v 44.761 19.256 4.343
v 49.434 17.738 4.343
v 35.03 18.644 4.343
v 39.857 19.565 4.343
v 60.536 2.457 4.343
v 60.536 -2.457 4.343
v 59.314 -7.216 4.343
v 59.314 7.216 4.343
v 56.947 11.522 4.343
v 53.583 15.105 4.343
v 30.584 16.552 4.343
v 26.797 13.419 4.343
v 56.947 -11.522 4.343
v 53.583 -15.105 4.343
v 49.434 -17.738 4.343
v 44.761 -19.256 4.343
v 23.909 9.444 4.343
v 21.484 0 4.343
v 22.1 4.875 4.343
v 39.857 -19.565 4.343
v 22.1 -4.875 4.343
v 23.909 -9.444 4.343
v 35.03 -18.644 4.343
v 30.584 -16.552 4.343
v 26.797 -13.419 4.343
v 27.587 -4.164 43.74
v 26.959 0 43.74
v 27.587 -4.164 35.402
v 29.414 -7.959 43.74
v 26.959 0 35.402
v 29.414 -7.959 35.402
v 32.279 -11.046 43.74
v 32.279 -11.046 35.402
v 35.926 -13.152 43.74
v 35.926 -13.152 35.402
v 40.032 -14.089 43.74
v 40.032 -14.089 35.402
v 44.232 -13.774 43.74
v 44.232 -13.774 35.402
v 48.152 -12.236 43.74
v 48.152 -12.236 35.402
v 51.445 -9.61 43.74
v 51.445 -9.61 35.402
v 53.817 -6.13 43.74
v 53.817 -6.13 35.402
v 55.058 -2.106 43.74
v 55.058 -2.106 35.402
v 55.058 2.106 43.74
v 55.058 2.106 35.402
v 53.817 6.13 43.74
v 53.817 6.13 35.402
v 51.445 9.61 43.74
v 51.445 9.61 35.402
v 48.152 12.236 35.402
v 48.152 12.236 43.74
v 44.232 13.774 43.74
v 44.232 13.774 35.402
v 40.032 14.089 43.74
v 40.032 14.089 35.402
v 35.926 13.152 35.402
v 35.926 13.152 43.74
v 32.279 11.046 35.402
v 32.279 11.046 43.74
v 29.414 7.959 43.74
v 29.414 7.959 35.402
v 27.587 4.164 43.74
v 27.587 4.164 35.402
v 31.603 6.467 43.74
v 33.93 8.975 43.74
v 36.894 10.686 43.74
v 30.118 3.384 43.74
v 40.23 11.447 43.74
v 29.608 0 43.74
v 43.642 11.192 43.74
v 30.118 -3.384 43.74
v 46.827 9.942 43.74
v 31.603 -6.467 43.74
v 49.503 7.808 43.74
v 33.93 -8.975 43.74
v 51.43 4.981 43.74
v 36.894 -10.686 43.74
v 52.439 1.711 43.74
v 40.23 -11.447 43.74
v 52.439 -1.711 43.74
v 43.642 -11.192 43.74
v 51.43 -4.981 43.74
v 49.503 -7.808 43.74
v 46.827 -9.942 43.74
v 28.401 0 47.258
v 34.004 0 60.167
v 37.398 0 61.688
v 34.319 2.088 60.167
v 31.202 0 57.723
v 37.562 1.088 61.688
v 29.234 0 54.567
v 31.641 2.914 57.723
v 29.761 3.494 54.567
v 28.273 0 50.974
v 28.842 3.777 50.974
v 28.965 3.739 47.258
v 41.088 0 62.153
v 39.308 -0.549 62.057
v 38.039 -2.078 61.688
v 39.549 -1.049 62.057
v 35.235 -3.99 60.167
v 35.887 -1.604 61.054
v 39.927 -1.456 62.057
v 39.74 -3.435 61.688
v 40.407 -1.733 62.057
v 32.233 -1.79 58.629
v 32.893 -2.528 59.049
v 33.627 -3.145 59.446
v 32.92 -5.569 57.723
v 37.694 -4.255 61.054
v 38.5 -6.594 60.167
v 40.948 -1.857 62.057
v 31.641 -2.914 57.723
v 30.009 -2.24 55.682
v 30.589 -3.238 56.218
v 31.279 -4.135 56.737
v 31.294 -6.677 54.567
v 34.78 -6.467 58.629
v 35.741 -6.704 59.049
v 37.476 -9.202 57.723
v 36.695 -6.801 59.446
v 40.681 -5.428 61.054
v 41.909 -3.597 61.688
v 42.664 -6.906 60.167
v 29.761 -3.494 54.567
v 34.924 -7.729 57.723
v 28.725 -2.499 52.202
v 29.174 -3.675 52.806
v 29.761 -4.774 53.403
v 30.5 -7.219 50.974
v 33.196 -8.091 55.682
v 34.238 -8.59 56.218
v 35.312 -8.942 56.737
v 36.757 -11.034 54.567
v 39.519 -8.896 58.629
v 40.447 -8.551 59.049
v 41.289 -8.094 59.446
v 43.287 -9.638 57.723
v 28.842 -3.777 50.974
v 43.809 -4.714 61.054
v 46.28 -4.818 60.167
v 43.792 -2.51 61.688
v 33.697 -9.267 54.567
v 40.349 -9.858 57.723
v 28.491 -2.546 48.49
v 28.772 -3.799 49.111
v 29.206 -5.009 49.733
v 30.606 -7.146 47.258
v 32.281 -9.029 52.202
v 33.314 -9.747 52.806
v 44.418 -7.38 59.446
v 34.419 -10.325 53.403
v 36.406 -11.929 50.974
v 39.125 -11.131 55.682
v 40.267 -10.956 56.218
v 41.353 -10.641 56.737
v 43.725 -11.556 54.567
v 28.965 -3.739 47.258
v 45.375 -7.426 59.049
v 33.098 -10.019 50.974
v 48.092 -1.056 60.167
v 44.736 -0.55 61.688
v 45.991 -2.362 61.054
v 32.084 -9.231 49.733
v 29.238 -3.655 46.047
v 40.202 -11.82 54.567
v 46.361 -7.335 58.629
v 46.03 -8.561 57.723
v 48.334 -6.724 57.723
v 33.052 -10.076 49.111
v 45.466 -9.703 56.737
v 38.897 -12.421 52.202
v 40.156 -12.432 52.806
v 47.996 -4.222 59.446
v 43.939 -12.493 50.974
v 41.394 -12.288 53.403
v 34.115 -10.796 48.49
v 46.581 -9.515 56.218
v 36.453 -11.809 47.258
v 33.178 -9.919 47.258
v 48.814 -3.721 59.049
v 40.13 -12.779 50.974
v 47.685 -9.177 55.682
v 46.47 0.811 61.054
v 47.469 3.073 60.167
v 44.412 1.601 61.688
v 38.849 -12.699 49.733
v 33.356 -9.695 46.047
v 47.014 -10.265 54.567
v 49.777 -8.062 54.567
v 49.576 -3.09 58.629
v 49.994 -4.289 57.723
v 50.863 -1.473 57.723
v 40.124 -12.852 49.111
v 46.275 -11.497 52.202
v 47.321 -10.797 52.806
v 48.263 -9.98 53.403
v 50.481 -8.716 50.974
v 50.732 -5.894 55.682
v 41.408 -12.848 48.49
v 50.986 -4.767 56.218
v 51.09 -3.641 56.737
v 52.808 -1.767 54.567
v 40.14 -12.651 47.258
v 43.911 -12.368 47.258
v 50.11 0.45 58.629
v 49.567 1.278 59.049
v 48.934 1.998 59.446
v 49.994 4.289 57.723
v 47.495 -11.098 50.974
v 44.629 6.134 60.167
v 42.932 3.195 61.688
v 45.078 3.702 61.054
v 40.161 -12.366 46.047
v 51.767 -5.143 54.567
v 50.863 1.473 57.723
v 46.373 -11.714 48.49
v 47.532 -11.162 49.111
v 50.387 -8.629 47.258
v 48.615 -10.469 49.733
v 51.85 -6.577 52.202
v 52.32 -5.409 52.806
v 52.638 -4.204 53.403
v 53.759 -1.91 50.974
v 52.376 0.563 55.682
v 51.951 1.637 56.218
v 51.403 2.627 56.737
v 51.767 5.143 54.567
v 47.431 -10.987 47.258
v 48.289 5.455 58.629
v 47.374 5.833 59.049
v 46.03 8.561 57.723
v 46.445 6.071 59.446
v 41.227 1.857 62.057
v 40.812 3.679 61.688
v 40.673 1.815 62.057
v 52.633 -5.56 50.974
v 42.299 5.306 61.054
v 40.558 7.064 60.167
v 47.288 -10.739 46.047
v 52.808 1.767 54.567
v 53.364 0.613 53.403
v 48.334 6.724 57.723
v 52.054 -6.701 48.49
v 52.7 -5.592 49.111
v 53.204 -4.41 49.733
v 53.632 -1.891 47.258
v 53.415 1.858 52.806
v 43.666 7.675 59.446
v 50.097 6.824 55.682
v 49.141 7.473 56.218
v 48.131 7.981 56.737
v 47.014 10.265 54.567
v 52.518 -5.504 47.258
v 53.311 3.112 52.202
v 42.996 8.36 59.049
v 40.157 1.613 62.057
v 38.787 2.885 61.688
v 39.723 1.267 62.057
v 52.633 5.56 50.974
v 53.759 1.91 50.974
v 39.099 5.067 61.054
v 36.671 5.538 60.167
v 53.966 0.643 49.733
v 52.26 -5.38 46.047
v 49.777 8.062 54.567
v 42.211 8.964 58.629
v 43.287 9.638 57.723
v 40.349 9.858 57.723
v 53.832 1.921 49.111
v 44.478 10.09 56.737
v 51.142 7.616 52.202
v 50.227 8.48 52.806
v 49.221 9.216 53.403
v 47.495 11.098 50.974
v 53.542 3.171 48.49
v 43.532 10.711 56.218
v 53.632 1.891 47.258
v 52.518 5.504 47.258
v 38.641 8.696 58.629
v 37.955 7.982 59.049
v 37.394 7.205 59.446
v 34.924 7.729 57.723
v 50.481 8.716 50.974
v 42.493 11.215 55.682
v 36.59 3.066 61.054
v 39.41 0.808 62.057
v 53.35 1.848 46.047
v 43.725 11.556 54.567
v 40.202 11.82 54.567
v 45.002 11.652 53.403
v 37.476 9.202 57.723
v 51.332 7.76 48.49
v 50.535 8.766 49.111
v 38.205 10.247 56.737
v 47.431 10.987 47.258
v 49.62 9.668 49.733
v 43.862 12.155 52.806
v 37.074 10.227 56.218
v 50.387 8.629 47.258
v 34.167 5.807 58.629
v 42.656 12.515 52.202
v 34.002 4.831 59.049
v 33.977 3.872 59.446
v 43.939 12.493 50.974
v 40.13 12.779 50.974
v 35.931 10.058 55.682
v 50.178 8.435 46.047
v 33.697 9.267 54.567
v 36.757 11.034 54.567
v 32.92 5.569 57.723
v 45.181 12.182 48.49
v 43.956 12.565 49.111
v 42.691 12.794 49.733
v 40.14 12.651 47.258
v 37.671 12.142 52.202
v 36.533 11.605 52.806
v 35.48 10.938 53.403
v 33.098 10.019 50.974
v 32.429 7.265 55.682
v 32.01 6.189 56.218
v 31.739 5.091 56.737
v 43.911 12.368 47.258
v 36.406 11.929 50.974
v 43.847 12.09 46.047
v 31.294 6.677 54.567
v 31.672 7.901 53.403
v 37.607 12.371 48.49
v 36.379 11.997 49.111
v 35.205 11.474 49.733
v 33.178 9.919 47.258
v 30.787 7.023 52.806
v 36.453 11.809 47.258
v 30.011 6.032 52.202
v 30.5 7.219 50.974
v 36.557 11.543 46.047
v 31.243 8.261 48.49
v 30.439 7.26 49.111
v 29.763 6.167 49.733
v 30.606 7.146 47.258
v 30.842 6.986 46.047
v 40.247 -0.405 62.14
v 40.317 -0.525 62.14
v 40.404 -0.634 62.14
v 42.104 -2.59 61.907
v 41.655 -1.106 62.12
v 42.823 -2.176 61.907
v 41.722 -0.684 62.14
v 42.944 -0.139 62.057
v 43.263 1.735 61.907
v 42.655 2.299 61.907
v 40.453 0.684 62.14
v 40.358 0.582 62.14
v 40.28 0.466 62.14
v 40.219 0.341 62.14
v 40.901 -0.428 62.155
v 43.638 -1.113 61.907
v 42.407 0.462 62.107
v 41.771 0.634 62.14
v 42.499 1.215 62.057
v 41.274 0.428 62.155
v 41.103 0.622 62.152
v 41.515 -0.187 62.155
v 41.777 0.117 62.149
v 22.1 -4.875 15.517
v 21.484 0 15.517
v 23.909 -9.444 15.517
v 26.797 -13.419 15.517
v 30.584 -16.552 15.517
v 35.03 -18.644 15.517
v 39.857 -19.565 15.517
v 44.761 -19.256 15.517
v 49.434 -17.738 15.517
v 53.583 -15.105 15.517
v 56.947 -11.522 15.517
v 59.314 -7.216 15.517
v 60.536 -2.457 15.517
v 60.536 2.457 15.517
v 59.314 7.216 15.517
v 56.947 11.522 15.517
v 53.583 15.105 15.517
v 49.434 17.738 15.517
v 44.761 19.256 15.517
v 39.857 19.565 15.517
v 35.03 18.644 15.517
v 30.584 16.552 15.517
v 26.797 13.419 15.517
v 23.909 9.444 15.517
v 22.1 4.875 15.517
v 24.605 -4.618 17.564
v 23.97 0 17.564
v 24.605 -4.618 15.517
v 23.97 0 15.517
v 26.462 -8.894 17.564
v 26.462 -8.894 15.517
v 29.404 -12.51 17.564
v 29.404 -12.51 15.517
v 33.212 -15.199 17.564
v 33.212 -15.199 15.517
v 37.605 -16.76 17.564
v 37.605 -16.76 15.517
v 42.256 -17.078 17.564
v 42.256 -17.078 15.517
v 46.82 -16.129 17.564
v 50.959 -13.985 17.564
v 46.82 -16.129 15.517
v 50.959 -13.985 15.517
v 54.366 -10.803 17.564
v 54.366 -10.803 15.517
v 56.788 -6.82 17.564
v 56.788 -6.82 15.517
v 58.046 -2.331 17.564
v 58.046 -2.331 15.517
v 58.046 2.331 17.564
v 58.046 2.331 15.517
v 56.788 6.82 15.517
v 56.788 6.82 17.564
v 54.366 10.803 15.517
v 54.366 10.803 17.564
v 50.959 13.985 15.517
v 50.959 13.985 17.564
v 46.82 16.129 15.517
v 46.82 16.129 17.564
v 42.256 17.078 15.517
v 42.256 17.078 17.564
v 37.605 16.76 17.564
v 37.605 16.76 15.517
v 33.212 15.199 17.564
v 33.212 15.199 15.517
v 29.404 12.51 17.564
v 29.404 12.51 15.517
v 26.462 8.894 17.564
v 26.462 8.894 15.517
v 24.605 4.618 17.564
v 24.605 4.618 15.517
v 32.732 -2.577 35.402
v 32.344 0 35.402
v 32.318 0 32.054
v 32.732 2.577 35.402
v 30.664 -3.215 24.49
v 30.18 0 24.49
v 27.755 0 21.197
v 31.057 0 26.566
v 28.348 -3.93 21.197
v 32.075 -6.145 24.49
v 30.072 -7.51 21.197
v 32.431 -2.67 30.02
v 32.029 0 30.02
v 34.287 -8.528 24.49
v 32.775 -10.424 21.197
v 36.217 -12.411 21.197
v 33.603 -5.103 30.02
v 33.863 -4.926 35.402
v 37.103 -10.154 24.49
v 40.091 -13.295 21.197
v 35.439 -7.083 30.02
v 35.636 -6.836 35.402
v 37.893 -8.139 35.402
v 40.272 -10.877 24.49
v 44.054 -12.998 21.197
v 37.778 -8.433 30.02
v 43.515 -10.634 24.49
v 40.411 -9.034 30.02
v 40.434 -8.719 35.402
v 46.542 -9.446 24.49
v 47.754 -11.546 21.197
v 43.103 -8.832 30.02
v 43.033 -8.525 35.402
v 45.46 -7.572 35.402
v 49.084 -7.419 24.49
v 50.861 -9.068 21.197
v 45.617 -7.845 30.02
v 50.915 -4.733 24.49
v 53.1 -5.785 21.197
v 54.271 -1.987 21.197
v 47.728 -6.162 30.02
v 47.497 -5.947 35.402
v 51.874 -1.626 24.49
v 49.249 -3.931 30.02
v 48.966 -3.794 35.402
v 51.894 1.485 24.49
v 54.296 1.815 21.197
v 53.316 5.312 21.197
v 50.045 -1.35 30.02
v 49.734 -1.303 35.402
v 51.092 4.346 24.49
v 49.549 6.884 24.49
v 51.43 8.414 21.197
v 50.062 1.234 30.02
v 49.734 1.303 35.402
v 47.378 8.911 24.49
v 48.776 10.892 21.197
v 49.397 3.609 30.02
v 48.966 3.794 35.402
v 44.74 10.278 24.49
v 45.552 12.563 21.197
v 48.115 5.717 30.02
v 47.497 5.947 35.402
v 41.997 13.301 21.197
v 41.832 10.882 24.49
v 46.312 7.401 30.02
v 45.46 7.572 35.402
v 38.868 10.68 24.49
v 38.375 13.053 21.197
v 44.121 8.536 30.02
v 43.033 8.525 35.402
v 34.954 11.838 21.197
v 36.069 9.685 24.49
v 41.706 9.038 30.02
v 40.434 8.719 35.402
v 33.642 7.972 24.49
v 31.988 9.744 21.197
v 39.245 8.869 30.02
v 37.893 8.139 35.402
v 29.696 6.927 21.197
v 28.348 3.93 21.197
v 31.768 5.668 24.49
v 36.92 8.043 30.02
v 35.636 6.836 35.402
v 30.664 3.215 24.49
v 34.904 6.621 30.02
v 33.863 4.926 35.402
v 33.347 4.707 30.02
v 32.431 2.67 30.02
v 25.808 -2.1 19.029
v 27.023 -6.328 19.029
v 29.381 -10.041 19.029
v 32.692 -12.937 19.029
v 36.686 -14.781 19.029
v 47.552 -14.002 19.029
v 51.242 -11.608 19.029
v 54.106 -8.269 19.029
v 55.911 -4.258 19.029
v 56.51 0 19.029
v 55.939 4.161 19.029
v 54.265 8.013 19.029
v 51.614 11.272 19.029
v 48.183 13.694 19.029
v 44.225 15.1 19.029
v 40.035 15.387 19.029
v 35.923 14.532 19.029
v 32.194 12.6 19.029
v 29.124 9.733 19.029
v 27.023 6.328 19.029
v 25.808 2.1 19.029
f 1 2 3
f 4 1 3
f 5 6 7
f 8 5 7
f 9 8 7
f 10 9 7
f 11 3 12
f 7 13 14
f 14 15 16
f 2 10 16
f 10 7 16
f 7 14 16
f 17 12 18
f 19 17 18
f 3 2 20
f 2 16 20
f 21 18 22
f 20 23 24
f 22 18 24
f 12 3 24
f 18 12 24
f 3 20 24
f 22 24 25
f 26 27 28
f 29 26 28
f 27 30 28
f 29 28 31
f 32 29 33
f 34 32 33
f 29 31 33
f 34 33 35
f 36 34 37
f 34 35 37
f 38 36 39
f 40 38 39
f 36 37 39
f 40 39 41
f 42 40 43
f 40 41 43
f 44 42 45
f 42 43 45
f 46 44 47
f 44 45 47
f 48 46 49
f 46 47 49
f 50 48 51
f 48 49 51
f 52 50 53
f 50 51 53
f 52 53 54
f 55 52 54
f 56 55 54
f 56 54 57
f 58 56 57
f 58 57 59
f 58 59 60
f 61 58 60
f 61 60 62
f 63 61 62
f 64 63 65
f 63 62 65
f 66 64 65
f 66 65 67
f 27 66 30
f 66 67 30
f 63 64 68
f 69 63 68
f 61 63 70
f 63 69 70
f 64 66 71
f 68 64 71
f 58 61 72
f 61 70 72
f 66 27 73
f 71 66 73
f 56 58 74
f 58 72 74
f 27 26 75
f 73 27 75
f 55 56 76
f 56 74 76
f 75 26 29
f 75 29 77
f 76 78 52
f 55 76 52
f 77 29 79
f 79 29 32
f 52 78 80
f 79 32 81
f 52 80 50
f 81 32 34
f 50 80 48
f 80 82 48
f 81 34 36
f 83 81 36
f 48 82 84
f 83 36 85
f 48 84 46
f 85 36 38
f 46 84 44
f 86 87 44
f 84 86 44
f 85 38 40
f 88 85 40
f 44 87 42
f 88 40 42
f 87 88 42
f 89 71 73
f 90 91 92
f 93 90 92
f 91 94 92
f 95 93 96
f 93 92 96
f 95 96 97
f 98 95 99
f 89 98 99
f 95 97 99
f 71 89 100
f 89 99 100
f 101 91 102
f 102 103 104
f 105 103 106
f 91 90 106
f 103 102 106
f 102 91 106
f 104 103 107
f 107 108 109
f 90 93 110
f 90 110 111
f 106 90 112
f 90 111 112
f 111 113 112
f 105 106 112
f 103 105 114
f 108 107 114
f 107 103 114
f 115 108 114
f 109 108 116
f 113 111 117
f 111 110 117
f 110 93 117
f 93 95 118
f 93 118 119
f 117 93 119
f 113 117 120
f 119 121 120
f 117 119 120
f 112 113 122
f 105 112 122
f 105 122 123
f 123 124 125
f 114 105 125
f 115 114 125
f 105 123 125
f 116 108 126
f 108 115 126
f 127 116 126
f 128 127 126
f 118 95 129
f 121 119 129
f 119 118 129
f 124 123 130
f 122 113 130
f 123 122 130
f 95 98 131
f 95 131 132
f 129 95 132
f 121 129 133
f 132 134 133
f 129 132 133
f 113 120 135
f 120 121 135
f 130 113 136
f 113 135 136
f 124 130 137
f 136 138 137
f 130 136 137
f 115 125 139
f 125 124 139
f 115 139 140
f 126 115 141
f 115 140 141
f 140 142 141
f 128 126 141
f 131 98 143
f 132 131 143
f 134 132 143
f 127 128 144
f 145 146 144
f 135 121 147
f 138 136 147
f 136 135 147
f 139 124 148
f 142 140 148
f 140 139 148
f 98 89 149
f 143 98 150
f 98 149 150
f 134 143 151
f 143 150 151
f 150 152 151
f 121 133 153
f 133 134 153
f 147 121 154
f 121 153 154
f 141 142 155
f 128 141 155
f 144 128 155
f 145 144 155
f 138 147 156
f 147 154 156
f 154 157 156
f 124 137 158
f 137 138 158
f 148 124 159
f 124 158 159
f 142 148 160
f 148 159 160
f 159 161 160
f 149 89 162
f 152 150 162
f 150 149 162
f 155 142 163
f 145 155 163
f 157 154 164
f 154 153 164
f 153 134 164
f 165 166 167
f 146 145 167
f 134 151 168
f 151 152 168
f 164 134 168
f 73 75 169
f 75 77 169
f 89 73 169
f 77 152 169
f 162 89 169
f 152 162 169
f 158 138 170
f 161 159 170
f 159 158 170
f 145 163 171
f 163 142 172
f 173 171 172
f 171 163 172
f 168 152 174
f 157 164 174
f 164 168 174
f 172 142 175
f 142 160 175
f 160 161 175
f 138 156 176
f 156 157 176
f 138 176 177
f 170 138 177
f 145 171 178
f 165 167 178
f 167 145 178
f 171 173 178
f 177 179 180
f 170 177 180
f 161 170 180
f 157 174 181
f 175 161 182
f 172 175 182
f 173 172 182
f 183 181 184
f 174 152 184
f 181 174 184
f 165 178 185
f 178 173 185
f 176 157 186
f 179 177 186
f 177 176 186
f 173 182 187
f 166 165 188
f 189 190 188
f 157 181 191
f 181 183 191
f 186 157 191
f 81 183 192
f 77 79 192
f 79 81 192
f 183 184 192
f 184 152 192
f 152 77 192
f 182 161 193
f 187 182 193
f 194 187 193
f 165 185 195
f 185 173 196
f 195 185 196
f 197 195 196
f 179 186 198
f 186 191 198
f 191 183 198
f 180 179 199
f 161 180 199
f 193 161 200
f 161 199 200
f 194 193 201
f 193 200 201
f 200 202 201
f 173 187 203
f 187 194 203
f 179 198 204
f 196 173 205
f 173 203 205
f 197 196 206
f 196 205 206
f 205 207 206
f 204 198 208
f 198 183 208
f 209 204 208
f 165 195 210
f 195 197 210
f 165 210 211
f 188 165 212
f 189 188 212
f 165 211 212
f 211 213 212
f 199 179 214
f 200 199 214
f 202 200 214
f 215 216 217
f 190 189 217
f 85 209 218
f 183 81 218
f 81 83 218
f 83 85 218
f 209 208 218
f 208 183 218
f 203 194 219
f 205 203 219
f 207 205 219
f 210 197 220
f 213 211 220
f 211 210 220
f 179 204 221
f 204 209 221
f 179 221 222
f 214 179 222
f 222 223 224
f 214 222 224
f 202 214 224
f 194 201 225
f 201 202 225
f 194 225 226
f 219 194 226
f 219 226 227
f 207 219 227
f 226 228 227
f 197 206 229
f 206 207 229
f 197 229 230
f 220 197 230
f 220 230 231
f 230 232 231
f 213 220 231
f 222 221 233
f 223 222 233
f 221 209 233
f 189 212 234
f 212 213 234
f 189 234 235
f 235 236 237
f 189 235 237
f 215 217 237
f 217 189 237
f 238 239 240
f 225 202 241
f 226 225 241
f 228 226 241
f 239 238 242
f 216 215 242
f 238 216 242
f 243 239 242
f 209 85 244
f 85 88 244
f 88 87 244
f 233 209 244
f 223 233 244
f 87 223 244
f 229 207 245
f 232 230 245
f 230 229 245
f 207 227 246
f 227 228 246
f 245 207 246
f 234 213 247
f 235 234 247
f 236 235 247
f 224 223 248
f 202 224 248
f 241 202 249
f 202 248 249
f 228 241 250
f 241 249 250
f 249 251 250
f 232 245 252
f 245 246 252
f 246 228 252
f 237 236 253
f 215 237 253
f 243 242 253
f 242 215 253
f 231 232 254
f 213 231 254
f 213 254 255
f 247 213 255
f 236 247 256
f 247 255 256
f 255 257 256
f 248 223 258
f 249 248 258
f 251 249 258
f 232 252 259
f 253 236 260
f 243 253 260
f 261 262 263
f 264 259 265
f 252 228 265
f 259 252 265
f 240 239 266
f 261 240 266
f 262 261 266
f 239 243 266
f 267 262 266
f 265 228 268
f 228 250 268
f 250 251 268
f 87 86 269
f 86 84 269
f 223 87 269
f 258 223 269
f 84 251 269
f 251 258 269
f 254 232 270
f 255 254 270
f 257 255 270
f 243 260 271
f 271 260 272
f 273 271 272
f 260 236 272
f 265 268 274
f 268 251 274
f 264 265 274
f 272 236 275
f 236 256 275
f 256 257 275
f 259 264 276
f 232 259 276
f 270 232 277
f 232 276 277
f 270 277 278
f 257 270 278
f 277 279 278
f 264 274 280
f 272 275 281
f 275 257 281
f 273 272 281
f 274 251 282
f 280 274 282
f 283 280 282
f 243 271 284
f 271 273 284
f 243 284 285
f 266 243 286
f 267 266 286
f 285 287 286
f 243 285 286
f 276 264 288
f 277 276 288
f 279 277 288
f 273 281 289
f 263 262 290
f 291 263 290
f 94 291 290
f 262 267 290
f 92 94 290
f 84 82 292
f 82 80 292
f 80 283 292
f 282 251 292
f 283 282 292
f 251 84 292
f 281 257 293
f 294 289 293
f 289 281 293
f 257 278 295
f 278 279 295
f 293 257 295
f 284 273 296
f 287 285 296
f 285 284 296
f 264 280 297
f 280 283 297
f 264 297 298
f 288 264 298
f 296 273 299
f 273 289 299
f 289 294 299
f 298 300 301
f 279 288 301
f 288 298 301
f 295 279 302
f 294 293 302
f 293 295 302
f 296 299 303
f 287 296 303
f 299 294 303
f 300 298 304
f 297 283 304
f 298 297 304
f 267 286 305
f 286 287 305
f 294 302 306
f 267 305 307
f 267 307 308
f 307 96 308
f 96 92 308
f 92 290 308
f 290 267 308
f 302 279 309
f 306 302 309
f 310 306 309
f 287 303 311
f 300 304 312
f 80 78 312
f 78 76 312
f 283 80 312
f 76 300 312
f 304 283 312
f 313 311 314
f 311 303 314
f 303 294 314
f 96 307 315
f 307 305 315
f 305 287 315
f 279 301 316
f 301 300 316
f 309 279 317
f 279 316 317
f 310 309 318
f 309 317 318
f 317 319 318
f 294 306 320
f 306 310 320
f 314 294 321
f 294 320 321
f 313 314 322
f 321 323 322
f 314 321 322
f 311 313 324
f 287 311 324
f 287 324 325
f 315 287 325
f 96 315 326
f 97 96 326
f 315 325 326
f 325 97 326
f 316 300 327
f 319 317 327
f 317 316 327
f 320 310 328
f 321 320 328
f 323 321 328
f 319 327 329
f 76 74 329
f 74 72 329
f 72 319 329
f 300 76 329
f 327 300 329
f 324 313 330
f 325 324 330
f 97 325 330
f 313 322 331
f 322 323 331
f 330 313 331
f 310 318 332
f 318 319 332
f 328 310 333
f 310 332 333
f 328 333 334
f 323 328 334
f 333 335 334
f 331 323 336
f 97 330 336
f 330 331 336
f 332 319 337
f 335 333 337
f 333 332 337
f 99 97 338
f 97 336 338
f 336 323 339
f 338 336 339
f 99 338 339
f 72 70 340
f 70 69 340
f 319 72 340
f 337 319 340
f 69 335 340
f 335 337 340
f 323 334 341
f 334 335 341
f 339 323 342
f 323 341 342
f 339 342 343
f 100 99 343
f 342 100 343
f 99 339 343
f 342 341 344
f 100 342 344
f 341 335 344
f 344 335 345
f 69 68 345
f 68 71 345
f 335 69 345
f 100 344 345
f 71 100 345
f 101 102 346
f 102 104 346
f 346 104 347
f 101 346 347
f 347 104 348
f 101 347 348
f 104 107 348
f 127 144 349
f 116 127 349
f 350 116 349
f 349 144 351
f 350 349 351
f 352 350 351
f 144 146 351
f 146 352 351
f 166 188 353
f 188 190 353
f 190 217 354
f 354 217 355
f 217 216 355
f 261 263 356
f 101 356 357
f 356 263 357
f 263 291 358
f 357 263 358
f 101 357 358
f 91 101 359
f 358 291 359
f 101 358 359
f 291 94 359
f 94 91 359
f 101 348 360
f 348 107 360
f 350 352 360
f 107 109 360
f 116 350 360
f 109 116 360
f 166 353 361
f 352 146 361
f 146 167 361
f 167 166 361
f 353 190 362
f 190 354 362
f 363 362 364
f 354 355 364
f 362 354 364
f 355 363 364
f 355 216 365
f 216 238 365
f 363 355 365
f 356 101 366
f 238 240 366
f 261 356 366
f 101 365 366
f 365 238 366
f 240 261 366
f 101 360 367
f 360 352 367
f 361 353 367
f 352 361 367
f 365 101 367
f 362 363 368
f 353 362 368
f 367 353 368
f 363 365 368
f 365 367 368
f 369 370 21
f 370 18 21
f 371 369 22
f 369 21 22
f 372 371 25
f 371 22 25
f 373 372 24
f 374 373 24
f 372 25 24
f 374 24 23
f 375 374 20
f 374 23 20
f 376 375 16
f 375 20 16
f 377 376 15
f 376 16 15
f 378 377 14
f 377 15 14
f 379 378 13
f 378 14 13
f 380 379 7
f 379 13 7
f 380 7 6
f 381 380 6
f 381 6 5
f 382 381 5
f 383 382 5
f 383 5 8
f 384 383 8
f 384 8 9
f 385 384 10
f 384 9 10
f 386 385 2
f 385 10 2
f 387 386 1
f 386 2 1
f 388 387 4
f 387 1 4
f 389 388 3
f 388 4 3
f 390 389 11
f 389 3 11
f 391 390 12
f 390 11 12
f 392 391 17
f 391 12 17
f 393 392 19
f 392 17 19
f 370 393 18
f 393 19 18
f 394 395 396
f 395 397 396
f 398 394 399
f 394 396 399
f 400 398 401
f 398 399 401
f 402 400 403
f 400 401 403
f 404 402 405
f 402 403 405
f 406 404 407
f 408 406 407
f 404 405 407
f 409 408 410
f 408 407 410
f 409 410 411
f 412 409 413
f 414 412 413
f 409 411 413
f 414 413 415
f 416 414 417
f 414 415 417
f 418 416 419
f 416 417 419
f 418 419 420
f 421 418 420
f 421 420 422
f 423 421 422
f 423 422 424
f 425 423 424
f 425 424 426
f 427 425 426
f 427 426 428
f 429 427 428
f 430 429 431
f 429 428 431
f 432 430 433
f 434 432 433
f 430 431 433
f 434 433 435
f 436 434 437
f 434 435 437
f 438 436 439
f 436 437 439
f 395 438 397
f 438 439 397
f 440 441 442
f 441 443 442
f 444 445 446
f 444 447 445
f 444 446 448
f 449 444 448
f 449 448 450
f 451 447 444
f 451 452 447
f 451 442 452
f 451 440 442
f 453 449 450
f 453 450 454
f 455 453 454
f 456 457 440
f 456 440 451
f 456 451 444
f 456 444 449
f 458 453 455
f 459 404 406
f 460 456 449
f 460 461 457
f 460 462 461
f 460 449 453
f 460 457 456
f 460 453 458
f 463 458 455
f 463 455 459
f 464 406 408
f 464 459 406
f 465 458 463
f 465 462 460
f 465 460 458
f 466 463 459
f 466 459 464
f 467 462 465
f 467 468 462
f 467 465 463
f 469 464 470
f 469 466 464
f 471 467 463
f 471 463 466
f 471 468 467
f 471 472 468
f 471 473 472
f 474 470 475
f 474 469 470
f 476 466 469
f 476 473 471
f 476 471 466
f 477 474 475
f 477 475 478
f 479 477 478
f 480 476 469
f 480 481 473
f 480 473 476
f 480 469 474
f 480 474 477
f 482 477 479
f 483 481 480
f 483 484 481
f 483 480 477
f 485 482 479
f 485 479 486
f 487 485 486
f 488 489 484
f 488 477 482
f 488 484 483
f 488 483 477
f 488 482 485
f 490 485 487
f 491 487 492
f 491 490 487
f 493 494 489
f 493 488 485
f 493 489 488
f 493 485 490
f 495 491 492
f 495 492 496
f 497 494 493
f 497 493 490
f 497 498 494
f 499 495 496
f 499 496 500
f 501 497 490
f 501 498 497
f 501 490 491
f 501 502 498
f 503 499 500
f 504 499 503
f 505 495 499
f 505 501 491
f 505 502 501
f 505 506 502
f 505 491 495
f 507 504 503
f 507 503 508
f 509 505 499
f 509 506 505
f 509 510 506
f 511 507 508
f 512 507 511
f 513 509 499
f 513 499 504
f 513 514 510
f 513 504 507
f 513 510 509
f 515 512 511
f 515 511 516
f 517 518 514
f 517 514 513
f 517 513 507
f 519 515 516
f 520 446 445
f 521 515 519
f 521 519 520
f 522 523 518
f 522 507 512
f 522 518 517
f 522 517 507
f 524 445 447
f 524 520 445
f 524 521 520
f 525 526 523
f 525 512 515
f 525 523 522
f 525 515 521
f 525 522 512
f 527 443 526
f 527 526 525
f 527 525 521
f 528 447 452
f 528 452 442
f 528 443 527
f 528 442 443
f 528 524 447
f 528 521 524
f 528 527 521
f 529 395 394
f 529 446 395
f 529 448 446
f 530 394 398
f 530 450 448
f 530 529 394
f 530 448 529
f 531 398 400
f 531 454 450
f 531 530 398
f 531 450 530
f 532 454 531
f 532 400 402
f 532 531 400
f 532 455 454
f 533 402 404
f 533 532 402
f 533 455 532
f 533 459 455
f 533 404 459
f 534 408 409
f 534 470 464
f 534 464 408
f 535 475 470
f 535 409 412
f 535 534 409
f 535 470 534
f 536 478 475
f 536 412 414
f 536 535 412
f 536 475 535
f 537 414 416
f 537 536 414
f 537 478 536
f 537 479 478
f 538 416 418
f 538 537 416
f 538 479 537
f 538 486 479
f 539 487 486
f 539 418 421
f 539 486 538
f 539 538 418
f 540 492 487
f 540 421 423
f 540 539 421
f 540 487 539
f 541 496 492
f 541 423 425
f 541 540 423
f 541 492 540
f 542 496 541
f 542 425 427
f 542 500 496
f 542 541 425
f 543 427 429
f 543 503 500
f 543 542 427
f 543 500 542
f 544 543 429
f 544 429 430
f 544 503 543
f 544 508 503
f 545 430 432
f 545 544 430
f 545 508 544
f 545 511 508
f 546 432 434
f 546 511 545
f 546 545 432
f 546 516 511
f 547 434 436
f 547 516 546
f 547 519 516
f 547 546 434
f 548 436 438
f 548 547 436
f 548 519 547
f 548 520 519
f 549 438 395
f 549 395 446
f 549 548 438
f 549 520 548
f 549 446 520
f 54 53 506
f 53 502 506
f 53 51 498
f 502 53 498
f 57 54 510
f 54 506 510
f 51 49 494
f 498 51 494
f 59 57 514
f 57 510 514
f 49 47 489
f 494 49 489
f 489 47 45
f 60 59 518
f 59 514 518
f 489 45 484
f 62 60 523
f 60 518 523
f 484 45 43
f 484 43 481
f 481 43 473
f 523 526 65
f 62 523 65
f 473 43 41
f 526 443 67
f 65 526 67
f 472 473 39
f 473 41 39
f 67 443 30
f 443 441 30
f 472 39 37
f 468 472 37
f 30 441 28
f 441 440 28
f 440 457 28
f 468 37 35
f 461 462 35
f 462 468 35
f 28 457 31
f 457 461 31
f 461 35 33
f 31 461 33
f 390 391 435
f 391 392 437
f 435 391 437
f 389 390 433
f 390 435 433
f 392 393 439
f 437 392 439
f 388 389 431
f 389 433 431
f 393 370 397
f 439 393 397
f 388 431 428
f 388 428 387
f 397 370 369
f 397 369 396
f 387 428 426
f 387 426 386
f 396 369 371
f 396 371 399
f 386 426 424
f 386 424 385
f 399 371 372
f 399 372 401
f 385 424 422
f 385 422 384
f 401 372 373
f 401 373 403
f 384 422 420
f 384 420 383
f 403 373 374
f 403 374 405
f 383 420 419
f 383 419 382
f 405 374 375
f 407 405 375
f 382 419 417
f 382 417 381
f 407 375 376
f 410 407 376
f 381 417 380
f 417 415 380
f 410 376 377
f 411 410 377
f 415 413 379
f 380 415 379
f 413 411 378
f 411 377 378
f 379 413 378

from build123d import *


with BuildPart() as f1:
    # F0 (on Front) → F1 (revolve)
    with BuildSketch(Plane.XZ):
        with BuildLine():
            Line((21.4843731374, 4.3428274803), (41.0876013339, 4.3428274803))
            Line((41.0876013339, 4.3428274803), (41.0876013339, 62.1529296041))
            ThreePointArc((41.0876013339, 62.1529296041), (30.1010892462, 56.2177329883), (29.6080578119, 43.7402762473))
            Line((29.6080578119, 43.7402762473), (26.9590262324, 43.7402762473))
            Line((26.9590262324, 43.7402762473), (26.9590262324, 35.4017727077))
            Line((26.9590262324, 35.4017727077), (32.3437526822, 35.4017727077))
            add(Edge.make_bspline(
                [(23.9697434008, 17.5643283874), (24.4452026127, 17.9524259038), (25.5687837688, 18.8695583209), (28.1276992622, 21.4895483235), (30.3506464307, 24.477499549), (31.1090443397, 26.7028247163), (31.6503786901, 28.3955510794), (31.931543292, 29.5882453803), (32.2221401703, 30.8581068175), (32.3685529921, 32.4082320019), (32.3244088201, 34.1583983403), (32.337700047, 35.012724676), (32.3437526822, 35.4017727077)],
                knots=[0, 0, 0, 0, 0.1005557256, 0.2376282036, 0.3761093569, 0.4848878958, 0.5784563238, 0.6567360311, 0.7370403182, 0.826610186, 0.921040751, 1, 1, 1, 1], degree=3))
            Line((23.9697434008, 17.5643283874), (23.9697434008, 15.5169330537))
            Line((23.9697434008, 15.5169330537), (21.4843731374, 15.5169330537))
            Line((21.4843731374, 15.5169330537), (21.4843731374, 4.3428274803))
        make_face()
    revolve(axis=Axis((41.0876013339, 0, 33.2478785422), (0, 0, 1)))


solid = f1.part
